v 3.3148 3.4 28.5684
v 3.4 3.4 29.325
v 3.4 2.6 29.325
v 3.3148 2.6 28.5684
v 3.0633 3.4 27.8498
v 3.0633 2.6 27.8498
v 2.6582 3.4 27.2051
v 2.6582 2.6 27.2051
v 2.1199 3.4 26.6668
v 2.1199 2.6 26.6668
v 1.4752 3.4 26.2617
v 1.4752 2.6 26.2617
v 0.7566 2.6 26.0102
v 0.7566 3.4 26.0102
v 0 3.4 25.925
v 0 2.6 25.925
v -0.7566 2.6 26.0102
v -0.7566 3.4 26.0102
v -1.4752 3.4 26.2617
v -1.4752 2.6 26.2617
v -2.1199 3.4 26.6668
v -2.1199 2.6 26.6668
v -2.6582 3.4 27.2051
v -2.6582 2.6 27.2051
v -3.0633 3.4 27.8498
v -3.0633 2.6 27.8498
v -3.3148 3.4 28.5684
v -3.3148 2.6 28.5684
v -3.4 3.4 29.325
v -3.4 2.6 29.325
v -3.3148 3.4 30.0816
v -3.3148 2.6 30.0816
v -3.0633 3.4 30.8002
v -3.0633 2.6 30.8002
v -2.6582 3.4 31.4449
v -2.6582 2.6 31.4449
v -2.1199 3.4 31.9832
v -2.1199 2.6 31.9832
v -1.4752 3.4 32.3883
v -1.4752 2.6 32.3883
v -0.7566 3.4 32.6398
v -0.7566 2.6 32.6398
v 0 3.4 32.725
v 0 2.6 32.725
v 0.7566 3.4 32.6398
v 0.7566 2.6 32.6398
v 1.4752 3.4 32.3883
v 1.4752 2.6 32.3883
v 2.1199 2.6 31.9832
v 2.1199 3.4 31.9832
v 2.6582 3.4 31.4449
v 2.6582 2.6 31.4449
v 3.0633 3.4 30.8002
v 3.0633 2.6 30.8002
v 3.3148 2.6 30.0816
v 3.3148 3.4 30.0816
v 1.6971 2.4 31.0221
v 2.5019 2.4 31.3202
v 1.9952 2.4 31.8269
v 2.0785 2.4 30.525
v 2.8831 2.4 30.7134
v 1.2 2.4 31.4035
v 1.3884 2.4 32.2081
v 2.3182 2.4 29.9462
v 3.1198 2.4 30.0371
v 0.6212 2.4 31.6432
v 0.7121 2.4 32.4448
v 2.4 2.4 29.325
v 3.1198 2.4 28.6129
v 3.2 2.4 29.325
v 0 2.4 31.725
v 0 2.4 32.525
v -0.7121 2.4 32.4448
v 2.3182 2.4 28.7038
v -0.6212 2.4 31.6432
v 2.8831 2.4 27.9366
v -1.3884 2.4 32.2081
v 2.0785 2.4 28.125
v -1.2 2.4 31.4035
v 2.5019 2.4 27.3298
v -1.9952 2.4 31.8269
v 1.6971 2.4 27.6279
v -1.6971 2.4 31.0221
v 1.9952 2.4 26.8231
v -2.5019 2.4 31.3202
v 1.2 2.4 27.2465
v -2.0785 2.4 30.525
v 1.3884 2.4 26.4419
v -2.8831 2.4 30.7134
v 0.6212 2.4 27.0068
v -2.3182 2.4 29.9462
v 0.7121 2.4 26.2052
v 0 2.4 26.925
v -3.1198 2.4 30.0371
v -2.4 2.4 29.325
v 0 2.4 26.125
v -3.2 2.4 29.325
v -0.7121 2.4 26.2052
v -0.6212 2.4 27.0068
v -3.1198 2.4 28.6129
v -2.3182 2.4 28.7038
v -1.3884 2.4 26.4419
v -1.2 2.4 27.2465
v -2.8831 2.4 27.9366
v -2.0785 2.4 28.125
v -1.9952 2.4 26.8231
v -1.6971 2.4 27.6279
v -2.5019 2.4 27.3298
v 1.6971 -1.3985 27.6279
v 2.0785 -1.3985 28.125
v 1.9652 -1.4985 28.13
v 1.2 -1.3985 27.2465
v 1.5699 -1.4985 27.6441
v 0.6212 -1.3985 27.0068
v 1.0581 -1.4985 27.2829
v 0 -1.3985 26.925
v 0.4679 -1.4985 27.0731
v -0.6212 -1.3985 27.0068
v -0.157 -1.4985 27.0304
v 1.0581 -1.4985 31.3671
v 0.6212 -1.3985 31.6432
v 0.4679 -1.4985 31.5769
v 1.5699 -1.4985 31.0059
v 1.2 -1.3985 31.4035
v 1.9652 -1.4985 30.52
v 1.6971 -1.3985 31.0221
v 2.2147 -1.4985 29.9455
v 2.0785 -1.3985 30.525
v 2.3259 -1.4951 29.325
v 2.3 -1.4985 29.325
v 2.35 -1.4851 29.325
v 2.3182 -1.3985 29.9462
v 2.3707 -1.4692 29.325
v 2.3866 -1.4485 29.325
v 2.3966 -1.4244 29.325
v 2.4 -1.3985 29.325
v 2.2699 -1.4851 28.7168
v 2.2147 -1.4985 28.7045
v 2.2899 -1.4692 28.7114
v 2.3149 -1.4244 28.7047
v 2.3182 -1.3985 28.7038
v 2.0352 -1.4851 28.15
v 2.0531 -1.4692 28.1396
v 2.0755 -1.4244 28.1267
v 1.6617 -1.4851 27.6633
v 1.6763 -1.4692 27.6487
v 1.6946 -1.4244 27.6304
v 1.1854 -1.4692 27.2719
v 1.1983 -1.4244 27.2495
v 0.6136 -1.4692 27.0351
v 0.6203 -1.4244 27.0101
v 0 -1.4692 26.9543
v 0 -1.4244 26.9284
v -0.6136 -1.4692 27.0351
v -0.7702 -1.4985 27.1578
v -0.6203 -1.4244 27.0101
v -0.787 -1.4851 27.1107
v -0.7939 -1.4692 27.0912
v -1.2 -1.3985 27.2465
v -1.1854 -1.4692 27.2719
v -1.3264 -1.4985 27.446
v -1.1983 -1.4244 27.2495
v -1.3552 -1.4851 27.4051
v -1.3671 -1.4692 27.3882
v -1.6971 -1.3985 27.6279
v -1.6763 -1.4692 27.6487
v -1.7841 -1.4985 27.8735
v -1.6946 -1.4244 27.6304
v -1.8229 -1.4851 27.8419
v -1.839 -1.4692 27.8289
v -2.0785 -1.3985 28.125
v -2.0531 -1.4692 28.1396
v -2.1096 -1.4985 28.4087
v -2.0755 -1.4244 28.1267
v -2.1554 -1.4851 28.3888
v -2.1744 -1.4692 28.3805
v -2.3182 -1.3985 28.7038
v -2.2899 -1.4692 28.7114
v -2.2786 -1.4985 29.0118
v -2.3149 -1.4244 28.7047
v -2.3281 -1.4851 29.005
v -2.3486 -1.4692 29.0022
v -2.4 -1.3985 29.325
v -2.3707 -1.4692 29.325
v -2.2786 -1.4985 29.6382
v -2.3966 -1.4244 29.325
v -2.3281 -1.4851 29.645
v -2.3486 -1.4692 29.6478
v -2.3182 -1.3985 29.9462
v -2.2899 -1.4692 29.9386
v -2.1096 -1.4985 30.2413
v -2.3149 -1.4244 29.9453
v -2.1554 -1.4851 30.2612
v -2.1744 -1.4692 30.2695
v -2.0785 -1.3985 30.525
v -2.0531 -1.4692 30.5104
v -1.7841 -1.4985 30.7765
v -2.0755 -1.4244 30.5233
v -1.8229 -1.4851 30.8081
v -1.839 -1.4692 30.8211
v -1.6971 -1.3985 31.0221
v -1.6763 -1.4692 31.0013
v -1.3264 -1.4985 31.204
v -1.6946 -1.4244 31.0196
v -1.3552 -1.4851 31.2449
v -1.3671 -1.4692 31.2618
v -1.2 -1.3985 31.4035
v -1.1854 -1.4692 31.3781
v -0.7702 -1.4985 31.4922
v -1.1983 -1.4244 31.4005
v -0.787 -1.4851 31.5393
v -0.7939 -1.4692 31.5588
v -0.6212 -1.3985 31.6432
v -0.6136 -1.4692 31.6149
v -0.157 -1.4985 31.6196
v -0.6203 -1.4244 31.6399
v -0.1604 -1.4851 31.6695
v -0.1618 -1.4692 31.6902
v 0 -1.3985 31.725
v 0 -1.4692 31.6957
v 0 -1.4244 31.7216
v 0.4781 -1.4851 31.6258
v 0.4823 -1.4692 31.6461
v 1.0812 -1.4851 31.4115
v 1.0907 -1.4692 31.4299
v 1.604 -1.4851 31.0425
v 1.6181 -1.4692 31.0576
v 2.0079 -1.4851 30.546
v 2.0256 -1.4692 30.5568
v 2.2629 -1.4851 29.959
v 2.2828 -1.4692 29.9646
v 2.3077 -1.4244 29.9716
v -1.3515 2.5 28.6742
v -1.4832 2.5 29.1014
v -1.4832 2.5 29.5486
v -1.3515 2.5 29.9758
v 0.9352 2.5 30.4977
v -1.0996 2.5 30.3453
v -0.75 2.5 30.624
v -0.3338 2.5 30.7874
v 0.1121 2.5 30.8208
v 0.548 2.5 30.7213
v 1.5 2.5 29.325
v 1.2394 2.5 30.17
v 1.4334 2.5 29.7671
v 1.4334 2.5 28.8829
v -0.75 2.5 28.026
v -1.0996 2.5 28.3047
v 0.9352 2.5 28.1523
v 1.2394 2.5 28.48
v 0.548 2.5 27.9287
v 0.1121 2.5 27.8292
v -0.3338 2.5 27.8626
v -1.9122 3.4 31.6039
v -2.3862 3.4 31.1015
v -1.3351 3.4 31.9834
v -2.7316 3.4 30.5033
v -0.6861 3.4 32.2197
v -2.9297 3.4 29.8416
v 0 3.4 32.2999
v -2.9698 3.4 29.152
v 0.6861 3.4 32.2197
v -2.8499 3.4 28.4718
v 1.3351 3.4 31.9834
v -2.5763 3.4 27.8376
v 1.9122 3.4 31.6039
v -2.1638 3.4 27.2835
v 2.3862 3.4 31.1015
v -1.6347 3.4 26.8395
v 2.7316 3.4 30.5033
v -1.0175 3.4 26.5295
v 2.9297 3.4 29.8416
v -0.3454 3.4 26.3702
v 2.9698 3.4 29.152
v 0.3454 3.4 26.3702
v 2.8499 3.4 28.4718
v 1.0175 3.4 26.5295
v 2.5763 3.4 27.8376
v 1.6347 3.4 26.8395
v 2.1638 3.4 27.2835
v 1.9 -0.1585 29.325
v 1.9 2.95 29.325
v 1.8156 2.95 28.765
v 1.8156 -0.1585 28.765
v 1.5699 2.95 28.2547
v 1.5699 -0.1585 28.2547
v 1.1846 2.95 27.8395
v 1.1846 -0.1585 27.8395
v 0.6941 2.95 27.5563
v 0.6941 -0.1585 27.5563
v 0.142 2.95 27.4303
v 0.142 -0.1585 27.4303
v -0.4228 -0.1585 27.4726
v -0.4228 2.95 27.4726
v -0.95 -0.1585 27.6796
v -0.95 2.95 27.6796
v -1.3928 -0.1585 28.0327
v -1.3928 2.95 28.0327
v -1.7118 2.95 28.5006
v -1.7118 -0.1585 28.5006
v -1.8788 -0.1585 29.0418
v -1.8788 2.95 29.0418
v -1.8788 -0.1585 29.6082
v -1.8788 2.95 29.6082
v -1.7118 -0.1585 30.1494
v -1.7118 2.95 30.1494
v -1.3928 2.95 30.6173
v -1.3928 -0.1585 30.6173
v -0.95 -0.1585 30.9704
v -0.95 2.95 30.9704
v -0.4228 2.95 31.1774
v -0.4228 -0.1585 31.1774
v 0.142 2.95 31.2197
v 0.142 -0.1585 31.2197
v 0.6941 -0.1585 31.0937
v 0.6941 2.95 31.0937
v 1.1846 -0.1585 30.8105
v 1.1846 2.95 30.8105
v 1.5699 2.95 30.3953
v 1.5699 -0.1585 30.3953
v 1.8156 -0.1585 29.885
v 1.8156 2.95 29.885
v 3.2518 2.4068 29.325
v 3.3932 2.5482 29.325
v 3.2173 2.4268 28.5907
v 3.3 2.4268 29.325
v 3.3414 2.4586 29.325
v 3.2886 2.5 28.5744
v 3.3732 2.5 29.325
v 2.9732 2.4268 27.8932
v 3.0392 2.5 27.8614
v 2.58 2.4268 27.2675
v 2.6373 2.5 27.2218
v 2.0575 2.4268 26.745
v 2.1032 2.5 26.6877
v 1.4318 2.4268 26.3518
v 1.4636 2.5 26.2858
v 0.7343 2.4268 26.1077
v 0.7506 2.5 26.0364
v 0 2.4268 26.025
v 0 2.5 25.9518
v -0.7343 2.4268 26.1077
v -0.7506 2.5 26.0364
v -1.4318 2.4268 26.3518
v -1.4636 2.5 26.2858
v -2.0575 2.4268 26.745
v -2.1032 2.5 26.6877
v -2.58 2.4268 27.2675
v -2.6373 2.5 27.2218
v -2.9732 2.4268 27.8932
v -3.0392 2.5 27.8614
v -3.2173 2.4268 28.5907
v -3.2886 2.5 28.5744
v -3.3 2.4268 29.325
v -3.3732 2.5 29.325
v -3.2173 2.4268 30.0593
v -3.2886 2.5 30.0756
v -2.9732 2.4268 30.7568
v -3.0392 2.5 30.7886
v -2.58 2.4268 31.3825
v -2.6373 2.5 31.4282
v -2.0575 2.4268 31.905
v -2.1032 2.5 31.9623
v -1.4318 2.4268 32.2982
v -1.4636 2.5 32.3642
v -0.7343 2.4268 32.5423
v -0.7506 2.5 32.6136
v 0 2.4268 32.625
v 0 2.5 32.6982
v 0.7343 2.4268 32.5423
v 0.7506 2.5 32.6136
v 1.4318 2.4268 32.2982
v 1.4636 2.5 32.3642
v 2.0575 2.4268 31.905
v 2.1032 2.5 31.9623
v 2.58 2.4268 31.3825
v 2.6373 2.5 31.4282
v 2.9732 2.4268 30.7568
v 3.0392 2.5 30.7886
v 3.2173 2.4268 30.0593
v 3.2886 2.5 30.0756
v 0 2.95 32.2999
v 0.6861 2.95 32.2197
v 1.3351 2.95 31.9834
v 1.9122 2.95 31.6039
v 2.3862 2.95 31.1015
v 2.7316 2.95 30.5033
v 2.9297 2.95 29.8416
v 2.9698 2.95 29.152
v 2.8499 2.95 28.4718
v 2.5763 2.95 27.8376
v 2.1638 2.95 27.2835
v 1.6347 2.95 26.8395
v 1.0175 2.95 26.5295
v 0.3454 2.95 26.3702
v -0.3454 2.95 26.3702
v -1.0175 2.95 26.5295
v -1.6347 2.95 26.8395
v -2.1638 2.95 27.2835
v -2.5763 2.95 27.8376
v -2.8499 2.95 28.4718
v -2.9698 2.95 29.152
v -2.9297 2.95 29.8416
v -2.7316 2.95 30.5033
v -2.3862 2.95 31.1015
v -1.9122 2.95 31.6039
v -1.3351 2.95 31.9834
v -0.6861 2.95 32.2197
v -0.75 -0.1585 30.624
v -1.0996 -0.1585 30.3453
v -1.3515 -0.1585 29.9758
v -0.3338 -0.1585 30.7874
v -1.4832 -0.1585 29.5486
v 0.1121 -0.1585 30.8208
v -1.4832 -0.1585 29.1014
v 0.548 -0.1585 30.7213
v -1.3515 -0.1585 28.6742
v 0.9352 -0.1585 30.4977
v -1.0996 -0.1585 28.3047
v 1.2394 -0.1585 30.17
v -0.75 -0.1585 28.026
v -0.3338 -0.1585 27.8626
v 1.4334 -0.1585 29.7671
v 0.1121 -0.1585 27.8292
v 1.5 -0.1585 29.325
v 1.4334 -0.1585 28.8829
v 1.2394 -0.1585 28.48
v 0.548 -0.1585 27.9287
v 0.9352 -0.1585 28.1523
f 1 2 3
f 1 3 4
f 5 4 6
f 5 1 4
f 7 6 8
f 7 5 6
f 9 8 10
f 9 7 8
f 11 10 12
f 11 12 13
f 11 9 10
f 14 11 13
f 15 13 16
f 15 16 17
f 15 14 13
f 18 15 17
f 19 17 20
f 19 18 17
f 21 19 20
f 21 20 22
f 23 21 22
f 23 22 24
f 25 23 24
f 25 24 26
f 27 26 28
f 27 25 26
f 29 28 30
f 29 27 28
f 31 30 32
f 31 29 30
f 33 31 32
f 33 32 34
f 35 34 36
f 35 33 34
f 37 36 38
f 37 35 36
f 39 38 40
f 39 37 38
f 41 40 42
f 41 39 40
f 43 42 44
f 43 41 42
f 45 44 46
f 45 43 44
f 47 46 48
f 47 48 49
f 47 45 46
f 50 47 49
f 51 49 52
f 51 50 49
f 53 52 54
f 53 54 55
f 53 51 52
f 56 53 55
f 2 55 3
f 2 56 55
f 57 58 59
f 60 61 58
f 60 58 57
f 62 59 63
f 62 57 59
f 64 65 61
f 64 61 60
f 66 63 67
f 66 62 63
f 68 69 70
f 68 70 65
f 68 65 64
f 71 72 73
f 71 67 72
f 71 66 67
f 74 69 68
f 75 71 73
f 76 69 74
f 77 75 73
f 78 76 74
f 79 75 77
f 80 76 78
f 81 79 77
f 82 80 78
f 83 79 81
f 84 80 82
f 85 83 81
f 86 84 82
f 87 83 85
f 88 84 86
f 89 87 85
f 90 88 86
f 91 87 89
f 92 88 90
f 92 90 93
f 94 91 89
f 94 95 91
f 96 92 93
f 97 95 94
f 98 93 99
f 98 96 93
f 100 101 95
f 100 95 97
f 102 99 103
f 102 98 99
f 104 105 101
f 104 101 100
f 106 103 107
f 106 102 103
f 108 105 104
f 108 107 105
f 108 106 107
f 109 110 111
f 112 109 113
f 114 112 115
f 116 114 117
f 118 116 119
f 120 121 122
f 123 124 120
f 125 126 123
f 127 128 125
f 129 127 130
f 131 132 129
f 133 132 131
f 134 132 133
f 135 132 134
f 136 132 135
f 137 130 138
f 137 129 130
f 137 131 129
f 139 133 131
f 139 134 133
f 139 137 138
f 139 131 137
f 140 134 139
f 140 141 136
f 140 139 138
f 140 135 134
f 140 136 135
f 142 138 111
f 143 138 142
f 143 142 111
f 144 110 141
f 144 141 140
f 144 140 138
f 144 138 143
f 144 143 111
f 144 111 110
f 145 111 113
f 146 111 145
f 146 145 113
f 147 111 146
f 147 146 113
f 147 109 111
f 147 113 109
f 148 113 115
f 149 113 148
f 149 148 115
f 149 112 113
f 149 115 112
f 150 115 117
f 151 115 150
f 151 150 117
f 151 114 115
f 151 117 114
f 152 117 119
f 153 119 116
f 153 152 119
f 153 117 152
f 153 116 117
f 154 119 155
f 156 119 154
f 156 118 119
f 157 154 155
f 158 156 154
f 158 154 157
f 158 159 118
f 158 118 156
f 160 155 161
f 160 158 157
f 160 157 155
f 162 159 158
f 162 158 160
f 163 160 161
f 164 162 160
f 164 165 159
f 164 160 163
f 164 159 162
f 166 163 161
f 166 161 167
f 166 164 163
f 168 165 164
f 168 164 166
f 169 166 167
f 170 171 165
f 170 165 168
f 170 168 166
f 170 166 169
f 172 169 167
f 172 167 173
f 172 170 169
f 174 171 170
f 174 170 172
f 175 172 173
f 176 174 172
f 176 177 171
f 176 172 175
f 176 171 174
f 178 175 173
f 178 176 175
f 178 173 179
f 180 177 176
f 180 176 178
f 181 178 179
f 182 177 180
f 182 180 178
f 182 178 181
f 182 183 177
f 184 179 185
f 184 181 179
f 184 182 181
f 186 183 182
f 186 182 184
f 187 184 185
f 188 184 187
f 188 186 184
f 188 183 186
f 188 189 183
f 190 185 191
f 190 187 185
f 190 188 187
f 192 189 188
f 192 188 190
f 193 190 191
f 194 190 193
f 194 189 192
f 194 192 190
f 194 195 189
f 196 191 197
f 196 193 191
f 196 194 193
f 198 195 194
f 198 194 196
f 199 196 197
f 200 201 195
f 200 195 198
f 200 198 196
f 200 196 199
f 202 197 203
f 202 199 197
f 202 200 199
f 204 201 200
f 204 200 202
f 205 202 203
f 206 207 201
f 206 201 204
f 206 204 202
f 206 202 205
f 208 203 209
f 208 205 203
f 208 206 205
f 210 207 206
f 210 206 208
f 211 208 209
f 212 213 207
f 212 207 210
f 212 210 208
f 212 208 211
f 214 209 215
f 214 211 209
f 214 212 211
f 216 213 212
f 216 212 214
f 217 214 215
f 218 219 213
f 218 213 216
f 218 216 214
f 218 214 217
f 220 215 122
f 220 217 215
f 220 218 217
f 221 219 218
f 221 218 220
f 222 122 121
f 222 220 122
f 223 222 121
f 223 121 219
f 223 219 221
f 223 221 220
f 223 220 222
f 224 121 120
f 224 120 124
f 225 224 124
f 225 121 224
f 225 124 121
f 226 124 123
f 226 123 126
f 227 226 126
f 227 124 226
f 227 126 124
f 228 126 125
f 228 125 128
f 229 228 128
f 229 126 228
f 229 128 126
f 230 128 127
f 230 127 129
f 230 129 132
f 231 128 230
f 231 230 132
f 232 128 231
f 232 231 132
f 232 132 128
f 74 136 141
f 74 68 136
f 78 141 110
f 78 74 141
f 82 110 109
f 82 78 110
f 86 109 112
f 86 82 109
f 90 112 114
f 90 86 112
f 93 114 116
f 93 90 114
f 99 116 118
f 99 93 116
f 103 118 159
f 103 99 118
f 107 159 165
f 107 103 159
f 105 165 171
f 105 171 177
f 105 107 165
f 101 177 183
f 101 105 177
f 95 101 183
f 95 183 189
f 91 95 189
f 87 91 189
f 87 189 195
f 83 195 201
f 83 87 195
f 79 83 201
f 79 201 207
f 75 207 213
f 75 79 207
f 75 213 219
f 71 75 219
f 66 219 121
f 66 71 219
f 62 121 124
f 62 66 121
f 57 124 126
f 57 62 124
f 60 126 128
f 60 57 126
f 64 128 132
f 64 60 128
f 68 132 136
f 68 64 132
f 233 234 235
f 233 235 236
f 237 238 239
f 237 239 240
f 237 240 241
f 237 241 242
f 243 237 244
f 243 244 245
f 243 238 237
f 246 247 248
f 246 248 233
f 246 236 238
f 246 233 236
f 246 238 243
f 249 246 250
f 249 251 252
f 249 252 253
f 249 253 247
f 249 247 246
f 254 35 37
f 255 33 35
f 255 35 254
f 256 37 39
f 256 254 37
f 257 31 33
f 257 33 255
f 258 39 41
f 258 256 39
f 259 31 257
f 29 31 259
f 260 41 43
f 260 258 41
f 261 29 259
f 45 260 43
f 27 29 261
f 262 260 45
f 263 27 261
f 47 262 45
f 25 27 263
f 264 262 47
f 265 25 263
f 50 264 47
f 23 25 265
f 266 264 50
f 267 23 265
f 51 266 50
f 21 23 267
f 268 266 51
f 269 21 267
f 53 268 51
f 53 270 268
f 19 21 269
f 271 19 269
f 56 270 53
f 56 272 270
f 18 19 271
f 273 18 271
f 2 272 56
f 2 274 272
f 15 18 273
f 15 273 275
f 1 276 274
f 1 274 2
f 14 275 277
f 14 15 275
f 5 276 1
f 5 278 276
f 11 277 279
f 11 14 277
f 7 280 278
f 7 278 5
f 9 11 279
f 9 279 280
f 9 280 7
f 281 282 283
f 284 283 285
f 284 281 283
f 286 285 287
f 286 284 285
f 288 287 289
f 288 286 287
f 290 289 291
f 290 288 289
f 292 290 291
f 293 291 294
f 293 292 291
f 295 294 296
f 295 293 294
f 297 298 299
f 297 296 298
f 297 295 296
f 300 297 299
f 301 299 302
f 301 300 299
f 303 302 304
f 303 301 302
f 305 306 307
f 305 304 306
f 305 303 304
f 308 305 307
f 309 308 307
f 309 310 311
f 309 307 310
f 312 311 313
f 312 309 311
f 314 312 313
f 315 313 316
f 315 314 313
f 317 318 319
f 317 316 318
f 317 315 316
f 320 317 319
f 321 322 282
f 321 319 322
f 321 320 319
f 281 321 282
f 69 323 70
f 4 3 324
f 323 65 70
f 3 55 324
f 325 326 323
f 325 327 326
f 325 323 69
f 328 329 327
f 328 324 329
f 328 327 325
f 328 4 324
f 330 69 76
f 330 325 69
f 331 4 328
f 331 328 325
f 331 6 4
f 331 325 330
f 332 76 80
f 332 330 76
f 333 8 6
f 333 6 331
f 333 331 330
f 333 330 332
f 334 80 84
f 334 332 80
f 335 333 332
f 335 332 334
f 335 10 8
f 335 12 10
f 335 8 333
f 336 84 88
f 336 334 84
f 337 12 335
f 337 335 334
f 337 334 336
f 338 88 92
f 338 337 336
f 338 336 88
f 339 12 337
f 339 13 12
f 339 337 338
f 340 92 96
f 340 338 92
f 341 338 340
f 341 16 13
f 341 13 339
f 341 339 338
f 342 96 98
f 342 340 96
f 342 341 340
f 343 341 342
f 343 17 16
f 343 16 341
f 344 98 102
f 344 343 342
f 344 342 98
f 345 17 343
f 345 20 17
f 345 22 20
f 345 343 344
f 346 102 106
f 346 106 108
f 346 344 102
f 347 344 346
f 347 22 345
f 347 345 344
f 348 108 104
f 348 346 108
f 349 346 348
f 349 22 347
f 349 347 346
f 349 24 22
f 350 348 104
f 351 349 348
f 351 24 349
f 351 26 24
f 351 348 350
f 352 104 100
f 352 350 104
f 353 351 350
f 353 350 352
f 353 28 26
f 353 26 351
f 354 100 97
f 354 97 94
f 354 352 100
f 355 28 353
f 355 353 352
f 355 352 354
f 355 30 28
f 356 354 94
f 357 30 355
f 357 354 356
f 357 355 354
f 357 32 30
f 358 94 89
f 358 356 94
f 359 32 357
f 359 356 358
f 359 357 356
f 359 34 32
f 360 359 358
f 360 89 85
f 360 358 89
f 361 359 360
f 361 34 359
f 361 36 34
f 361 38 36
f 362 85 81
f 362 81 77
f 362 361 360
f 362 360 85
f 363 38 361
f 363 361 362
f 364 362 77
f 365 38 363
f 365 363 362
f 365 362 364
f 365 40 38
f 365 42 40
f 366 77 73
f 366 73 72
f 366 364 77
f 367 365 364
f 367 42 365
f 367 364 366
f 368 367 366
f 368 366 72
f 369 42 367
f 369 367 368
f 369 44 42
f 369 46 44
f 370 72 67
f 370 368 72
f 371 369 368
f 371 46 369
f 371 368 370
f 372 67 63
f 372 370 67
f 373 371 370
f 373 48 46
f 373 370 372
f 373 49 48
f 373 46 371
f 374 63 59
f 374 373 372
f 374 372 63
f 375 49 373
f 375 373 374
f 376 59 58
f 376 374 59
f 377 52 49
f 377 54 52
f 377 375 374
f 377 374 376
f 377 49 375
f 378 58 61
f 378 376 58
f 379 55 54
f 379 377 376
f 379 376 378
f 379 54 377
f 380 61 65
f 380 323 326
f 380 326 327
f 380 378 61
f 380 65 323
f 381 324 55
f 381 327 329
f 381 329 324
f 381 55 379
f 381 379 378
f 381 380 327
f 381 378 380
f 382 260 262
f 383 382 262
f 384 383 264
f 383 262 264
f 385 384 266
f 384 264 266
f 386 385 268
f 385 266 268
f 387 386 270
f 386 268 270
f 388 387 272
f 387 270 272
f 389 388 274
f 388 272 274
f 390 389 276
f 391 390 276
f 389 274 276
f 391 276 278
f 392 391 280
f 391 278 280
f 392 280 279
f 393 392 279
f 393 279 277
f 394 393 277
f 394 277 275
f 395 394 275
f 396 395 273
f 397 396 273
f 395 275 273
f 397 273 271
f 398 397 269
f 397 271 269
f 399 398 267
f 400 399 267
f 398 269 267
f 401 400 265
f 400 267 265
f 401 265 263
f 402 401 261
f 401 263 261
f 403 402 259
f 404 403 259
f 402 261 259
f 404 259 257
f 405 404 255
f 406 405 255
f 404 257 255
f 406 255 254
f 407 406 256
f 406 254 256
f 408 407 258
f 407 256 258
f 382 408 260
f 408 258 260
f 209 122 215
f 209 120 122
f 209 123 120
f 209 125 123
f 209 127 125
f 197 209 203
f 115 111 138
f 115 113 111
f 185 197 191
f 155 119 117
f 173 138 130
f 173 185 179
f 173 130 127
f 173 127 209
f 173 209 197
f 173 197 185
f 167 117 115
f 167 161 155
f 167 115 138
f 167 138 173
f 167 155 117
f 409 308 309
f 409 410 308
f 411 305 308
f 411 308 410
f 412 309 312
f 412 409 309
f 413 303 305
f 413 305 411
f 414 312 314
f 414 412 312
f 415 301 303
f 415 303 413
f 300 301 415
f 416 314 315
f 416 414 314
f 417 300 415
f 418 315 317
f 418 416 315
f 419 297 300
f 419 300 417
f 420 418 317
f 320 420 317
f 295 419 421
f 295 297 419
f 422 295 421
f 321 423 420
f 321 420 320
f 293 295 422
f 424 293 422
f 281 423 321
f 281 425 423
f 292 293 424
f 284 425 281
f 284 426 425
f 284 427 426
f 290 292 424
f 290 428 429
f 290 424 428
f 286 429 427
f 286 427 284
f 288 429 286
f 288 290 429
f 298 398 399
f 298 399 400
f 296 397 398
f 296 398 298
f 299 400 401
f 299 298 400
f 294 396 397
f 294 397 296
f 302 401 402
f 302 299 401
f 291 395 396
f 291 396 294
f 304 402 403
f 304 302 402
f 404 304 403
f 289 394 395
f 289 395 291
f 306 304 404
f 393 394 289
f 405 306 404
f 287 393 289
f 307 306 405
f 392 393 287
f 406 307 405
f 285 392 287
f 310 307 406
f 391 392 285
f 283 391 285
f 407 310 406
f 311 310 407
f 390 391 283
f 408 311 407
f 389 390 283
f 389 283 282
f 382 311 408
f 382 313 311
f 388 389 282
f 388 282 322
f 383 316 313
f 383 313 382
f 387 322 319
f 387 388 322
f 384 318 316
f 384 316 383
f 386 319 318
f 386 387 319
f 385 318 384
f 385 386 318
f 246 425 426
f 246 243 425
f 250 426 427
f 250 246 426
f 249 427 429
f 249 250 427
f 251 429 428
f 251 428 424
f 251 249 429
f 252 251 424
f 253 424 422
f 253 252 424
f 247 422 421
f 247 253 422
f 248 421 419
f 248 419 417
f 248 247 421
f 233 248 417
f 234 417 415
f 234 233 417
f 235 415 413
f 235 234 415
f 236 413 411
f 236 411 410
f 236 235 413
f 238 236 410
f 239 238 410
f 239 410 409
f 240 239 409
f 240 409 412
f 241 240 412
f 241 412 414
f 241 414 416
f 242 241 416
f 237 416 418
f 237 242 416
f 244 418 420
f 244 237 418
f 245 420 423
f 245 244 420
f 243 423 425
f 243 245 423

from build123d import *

# Parameters (mm, degrees)
FILLET1_R          = 0.2
SKETCH1_R          = 2.974873734
CUT_EXTRUDE1_DEPTH = 0.45


# Read off the part's stored shape, not the designer's step: Stock-Finger_Rubber_Sensor+Button-1
with BuildPart() as part:
    # Stock-Finger_Rubber_Sensor+Button-1 outl → Stock-Finger_Rubber_Sensor+Button-1 (revolve)
    with BuildSketch(Plane.XY.offset(29.325)):
        with BuildLine():
            Line((1.9, 3.4), (1.9, -0.158502039))
            Line((1.9, -0.158502039), (1.5, -0.158502039))
            Line((1.5, -0.158502039), (1.5, 2.5))
            Line((1.5, 2.5), (0, 2.5))
            Line((0, 2.5), (0, -1.498502039))
            Line((0, -1.498502039), (2.3, -1.498502039))
            ThreePointArc((2.3, -1.498502039), (2.370710678, -1.469212717), (2.4, -1.398502039))
            Line((2.4, -1.398502039), (2.4, 2.4))
            Line((2.4, 2.4), (3.4, 2.4))
            Line((3.4, 2.4), (3.4, 3.4))
            Line((3.4, 3.4), (1.9, 3.4))
        make_face()
    revolve(axis=Axis((0, 0, 29.325), (0, 1, 0)))

    # Fillet1
    fillet1_edges = [part.edges().sort_by_distance(p)[0] for p in [
        (-3.4, 2.4, 29.325),
    ]]
    fillet(fillet1_edges, radius=FILLET1_R)

    # Sketch1 → Cut-Extrude1 (cut)
    with BuildSketch(Plane(origin=(0, 3.4, 0), x_dir=(1, 0, 0), z_dir=(0, 1, 0))):
        with Locations(Location((0, -29.325, 0), (0, 0, 270))):
            Circle(SKETCH1_R)
    extrude(amount=-CUT_EXTRUDE1_DEPTH, mode=Mode.SUBTRACT)


solid = part.part
